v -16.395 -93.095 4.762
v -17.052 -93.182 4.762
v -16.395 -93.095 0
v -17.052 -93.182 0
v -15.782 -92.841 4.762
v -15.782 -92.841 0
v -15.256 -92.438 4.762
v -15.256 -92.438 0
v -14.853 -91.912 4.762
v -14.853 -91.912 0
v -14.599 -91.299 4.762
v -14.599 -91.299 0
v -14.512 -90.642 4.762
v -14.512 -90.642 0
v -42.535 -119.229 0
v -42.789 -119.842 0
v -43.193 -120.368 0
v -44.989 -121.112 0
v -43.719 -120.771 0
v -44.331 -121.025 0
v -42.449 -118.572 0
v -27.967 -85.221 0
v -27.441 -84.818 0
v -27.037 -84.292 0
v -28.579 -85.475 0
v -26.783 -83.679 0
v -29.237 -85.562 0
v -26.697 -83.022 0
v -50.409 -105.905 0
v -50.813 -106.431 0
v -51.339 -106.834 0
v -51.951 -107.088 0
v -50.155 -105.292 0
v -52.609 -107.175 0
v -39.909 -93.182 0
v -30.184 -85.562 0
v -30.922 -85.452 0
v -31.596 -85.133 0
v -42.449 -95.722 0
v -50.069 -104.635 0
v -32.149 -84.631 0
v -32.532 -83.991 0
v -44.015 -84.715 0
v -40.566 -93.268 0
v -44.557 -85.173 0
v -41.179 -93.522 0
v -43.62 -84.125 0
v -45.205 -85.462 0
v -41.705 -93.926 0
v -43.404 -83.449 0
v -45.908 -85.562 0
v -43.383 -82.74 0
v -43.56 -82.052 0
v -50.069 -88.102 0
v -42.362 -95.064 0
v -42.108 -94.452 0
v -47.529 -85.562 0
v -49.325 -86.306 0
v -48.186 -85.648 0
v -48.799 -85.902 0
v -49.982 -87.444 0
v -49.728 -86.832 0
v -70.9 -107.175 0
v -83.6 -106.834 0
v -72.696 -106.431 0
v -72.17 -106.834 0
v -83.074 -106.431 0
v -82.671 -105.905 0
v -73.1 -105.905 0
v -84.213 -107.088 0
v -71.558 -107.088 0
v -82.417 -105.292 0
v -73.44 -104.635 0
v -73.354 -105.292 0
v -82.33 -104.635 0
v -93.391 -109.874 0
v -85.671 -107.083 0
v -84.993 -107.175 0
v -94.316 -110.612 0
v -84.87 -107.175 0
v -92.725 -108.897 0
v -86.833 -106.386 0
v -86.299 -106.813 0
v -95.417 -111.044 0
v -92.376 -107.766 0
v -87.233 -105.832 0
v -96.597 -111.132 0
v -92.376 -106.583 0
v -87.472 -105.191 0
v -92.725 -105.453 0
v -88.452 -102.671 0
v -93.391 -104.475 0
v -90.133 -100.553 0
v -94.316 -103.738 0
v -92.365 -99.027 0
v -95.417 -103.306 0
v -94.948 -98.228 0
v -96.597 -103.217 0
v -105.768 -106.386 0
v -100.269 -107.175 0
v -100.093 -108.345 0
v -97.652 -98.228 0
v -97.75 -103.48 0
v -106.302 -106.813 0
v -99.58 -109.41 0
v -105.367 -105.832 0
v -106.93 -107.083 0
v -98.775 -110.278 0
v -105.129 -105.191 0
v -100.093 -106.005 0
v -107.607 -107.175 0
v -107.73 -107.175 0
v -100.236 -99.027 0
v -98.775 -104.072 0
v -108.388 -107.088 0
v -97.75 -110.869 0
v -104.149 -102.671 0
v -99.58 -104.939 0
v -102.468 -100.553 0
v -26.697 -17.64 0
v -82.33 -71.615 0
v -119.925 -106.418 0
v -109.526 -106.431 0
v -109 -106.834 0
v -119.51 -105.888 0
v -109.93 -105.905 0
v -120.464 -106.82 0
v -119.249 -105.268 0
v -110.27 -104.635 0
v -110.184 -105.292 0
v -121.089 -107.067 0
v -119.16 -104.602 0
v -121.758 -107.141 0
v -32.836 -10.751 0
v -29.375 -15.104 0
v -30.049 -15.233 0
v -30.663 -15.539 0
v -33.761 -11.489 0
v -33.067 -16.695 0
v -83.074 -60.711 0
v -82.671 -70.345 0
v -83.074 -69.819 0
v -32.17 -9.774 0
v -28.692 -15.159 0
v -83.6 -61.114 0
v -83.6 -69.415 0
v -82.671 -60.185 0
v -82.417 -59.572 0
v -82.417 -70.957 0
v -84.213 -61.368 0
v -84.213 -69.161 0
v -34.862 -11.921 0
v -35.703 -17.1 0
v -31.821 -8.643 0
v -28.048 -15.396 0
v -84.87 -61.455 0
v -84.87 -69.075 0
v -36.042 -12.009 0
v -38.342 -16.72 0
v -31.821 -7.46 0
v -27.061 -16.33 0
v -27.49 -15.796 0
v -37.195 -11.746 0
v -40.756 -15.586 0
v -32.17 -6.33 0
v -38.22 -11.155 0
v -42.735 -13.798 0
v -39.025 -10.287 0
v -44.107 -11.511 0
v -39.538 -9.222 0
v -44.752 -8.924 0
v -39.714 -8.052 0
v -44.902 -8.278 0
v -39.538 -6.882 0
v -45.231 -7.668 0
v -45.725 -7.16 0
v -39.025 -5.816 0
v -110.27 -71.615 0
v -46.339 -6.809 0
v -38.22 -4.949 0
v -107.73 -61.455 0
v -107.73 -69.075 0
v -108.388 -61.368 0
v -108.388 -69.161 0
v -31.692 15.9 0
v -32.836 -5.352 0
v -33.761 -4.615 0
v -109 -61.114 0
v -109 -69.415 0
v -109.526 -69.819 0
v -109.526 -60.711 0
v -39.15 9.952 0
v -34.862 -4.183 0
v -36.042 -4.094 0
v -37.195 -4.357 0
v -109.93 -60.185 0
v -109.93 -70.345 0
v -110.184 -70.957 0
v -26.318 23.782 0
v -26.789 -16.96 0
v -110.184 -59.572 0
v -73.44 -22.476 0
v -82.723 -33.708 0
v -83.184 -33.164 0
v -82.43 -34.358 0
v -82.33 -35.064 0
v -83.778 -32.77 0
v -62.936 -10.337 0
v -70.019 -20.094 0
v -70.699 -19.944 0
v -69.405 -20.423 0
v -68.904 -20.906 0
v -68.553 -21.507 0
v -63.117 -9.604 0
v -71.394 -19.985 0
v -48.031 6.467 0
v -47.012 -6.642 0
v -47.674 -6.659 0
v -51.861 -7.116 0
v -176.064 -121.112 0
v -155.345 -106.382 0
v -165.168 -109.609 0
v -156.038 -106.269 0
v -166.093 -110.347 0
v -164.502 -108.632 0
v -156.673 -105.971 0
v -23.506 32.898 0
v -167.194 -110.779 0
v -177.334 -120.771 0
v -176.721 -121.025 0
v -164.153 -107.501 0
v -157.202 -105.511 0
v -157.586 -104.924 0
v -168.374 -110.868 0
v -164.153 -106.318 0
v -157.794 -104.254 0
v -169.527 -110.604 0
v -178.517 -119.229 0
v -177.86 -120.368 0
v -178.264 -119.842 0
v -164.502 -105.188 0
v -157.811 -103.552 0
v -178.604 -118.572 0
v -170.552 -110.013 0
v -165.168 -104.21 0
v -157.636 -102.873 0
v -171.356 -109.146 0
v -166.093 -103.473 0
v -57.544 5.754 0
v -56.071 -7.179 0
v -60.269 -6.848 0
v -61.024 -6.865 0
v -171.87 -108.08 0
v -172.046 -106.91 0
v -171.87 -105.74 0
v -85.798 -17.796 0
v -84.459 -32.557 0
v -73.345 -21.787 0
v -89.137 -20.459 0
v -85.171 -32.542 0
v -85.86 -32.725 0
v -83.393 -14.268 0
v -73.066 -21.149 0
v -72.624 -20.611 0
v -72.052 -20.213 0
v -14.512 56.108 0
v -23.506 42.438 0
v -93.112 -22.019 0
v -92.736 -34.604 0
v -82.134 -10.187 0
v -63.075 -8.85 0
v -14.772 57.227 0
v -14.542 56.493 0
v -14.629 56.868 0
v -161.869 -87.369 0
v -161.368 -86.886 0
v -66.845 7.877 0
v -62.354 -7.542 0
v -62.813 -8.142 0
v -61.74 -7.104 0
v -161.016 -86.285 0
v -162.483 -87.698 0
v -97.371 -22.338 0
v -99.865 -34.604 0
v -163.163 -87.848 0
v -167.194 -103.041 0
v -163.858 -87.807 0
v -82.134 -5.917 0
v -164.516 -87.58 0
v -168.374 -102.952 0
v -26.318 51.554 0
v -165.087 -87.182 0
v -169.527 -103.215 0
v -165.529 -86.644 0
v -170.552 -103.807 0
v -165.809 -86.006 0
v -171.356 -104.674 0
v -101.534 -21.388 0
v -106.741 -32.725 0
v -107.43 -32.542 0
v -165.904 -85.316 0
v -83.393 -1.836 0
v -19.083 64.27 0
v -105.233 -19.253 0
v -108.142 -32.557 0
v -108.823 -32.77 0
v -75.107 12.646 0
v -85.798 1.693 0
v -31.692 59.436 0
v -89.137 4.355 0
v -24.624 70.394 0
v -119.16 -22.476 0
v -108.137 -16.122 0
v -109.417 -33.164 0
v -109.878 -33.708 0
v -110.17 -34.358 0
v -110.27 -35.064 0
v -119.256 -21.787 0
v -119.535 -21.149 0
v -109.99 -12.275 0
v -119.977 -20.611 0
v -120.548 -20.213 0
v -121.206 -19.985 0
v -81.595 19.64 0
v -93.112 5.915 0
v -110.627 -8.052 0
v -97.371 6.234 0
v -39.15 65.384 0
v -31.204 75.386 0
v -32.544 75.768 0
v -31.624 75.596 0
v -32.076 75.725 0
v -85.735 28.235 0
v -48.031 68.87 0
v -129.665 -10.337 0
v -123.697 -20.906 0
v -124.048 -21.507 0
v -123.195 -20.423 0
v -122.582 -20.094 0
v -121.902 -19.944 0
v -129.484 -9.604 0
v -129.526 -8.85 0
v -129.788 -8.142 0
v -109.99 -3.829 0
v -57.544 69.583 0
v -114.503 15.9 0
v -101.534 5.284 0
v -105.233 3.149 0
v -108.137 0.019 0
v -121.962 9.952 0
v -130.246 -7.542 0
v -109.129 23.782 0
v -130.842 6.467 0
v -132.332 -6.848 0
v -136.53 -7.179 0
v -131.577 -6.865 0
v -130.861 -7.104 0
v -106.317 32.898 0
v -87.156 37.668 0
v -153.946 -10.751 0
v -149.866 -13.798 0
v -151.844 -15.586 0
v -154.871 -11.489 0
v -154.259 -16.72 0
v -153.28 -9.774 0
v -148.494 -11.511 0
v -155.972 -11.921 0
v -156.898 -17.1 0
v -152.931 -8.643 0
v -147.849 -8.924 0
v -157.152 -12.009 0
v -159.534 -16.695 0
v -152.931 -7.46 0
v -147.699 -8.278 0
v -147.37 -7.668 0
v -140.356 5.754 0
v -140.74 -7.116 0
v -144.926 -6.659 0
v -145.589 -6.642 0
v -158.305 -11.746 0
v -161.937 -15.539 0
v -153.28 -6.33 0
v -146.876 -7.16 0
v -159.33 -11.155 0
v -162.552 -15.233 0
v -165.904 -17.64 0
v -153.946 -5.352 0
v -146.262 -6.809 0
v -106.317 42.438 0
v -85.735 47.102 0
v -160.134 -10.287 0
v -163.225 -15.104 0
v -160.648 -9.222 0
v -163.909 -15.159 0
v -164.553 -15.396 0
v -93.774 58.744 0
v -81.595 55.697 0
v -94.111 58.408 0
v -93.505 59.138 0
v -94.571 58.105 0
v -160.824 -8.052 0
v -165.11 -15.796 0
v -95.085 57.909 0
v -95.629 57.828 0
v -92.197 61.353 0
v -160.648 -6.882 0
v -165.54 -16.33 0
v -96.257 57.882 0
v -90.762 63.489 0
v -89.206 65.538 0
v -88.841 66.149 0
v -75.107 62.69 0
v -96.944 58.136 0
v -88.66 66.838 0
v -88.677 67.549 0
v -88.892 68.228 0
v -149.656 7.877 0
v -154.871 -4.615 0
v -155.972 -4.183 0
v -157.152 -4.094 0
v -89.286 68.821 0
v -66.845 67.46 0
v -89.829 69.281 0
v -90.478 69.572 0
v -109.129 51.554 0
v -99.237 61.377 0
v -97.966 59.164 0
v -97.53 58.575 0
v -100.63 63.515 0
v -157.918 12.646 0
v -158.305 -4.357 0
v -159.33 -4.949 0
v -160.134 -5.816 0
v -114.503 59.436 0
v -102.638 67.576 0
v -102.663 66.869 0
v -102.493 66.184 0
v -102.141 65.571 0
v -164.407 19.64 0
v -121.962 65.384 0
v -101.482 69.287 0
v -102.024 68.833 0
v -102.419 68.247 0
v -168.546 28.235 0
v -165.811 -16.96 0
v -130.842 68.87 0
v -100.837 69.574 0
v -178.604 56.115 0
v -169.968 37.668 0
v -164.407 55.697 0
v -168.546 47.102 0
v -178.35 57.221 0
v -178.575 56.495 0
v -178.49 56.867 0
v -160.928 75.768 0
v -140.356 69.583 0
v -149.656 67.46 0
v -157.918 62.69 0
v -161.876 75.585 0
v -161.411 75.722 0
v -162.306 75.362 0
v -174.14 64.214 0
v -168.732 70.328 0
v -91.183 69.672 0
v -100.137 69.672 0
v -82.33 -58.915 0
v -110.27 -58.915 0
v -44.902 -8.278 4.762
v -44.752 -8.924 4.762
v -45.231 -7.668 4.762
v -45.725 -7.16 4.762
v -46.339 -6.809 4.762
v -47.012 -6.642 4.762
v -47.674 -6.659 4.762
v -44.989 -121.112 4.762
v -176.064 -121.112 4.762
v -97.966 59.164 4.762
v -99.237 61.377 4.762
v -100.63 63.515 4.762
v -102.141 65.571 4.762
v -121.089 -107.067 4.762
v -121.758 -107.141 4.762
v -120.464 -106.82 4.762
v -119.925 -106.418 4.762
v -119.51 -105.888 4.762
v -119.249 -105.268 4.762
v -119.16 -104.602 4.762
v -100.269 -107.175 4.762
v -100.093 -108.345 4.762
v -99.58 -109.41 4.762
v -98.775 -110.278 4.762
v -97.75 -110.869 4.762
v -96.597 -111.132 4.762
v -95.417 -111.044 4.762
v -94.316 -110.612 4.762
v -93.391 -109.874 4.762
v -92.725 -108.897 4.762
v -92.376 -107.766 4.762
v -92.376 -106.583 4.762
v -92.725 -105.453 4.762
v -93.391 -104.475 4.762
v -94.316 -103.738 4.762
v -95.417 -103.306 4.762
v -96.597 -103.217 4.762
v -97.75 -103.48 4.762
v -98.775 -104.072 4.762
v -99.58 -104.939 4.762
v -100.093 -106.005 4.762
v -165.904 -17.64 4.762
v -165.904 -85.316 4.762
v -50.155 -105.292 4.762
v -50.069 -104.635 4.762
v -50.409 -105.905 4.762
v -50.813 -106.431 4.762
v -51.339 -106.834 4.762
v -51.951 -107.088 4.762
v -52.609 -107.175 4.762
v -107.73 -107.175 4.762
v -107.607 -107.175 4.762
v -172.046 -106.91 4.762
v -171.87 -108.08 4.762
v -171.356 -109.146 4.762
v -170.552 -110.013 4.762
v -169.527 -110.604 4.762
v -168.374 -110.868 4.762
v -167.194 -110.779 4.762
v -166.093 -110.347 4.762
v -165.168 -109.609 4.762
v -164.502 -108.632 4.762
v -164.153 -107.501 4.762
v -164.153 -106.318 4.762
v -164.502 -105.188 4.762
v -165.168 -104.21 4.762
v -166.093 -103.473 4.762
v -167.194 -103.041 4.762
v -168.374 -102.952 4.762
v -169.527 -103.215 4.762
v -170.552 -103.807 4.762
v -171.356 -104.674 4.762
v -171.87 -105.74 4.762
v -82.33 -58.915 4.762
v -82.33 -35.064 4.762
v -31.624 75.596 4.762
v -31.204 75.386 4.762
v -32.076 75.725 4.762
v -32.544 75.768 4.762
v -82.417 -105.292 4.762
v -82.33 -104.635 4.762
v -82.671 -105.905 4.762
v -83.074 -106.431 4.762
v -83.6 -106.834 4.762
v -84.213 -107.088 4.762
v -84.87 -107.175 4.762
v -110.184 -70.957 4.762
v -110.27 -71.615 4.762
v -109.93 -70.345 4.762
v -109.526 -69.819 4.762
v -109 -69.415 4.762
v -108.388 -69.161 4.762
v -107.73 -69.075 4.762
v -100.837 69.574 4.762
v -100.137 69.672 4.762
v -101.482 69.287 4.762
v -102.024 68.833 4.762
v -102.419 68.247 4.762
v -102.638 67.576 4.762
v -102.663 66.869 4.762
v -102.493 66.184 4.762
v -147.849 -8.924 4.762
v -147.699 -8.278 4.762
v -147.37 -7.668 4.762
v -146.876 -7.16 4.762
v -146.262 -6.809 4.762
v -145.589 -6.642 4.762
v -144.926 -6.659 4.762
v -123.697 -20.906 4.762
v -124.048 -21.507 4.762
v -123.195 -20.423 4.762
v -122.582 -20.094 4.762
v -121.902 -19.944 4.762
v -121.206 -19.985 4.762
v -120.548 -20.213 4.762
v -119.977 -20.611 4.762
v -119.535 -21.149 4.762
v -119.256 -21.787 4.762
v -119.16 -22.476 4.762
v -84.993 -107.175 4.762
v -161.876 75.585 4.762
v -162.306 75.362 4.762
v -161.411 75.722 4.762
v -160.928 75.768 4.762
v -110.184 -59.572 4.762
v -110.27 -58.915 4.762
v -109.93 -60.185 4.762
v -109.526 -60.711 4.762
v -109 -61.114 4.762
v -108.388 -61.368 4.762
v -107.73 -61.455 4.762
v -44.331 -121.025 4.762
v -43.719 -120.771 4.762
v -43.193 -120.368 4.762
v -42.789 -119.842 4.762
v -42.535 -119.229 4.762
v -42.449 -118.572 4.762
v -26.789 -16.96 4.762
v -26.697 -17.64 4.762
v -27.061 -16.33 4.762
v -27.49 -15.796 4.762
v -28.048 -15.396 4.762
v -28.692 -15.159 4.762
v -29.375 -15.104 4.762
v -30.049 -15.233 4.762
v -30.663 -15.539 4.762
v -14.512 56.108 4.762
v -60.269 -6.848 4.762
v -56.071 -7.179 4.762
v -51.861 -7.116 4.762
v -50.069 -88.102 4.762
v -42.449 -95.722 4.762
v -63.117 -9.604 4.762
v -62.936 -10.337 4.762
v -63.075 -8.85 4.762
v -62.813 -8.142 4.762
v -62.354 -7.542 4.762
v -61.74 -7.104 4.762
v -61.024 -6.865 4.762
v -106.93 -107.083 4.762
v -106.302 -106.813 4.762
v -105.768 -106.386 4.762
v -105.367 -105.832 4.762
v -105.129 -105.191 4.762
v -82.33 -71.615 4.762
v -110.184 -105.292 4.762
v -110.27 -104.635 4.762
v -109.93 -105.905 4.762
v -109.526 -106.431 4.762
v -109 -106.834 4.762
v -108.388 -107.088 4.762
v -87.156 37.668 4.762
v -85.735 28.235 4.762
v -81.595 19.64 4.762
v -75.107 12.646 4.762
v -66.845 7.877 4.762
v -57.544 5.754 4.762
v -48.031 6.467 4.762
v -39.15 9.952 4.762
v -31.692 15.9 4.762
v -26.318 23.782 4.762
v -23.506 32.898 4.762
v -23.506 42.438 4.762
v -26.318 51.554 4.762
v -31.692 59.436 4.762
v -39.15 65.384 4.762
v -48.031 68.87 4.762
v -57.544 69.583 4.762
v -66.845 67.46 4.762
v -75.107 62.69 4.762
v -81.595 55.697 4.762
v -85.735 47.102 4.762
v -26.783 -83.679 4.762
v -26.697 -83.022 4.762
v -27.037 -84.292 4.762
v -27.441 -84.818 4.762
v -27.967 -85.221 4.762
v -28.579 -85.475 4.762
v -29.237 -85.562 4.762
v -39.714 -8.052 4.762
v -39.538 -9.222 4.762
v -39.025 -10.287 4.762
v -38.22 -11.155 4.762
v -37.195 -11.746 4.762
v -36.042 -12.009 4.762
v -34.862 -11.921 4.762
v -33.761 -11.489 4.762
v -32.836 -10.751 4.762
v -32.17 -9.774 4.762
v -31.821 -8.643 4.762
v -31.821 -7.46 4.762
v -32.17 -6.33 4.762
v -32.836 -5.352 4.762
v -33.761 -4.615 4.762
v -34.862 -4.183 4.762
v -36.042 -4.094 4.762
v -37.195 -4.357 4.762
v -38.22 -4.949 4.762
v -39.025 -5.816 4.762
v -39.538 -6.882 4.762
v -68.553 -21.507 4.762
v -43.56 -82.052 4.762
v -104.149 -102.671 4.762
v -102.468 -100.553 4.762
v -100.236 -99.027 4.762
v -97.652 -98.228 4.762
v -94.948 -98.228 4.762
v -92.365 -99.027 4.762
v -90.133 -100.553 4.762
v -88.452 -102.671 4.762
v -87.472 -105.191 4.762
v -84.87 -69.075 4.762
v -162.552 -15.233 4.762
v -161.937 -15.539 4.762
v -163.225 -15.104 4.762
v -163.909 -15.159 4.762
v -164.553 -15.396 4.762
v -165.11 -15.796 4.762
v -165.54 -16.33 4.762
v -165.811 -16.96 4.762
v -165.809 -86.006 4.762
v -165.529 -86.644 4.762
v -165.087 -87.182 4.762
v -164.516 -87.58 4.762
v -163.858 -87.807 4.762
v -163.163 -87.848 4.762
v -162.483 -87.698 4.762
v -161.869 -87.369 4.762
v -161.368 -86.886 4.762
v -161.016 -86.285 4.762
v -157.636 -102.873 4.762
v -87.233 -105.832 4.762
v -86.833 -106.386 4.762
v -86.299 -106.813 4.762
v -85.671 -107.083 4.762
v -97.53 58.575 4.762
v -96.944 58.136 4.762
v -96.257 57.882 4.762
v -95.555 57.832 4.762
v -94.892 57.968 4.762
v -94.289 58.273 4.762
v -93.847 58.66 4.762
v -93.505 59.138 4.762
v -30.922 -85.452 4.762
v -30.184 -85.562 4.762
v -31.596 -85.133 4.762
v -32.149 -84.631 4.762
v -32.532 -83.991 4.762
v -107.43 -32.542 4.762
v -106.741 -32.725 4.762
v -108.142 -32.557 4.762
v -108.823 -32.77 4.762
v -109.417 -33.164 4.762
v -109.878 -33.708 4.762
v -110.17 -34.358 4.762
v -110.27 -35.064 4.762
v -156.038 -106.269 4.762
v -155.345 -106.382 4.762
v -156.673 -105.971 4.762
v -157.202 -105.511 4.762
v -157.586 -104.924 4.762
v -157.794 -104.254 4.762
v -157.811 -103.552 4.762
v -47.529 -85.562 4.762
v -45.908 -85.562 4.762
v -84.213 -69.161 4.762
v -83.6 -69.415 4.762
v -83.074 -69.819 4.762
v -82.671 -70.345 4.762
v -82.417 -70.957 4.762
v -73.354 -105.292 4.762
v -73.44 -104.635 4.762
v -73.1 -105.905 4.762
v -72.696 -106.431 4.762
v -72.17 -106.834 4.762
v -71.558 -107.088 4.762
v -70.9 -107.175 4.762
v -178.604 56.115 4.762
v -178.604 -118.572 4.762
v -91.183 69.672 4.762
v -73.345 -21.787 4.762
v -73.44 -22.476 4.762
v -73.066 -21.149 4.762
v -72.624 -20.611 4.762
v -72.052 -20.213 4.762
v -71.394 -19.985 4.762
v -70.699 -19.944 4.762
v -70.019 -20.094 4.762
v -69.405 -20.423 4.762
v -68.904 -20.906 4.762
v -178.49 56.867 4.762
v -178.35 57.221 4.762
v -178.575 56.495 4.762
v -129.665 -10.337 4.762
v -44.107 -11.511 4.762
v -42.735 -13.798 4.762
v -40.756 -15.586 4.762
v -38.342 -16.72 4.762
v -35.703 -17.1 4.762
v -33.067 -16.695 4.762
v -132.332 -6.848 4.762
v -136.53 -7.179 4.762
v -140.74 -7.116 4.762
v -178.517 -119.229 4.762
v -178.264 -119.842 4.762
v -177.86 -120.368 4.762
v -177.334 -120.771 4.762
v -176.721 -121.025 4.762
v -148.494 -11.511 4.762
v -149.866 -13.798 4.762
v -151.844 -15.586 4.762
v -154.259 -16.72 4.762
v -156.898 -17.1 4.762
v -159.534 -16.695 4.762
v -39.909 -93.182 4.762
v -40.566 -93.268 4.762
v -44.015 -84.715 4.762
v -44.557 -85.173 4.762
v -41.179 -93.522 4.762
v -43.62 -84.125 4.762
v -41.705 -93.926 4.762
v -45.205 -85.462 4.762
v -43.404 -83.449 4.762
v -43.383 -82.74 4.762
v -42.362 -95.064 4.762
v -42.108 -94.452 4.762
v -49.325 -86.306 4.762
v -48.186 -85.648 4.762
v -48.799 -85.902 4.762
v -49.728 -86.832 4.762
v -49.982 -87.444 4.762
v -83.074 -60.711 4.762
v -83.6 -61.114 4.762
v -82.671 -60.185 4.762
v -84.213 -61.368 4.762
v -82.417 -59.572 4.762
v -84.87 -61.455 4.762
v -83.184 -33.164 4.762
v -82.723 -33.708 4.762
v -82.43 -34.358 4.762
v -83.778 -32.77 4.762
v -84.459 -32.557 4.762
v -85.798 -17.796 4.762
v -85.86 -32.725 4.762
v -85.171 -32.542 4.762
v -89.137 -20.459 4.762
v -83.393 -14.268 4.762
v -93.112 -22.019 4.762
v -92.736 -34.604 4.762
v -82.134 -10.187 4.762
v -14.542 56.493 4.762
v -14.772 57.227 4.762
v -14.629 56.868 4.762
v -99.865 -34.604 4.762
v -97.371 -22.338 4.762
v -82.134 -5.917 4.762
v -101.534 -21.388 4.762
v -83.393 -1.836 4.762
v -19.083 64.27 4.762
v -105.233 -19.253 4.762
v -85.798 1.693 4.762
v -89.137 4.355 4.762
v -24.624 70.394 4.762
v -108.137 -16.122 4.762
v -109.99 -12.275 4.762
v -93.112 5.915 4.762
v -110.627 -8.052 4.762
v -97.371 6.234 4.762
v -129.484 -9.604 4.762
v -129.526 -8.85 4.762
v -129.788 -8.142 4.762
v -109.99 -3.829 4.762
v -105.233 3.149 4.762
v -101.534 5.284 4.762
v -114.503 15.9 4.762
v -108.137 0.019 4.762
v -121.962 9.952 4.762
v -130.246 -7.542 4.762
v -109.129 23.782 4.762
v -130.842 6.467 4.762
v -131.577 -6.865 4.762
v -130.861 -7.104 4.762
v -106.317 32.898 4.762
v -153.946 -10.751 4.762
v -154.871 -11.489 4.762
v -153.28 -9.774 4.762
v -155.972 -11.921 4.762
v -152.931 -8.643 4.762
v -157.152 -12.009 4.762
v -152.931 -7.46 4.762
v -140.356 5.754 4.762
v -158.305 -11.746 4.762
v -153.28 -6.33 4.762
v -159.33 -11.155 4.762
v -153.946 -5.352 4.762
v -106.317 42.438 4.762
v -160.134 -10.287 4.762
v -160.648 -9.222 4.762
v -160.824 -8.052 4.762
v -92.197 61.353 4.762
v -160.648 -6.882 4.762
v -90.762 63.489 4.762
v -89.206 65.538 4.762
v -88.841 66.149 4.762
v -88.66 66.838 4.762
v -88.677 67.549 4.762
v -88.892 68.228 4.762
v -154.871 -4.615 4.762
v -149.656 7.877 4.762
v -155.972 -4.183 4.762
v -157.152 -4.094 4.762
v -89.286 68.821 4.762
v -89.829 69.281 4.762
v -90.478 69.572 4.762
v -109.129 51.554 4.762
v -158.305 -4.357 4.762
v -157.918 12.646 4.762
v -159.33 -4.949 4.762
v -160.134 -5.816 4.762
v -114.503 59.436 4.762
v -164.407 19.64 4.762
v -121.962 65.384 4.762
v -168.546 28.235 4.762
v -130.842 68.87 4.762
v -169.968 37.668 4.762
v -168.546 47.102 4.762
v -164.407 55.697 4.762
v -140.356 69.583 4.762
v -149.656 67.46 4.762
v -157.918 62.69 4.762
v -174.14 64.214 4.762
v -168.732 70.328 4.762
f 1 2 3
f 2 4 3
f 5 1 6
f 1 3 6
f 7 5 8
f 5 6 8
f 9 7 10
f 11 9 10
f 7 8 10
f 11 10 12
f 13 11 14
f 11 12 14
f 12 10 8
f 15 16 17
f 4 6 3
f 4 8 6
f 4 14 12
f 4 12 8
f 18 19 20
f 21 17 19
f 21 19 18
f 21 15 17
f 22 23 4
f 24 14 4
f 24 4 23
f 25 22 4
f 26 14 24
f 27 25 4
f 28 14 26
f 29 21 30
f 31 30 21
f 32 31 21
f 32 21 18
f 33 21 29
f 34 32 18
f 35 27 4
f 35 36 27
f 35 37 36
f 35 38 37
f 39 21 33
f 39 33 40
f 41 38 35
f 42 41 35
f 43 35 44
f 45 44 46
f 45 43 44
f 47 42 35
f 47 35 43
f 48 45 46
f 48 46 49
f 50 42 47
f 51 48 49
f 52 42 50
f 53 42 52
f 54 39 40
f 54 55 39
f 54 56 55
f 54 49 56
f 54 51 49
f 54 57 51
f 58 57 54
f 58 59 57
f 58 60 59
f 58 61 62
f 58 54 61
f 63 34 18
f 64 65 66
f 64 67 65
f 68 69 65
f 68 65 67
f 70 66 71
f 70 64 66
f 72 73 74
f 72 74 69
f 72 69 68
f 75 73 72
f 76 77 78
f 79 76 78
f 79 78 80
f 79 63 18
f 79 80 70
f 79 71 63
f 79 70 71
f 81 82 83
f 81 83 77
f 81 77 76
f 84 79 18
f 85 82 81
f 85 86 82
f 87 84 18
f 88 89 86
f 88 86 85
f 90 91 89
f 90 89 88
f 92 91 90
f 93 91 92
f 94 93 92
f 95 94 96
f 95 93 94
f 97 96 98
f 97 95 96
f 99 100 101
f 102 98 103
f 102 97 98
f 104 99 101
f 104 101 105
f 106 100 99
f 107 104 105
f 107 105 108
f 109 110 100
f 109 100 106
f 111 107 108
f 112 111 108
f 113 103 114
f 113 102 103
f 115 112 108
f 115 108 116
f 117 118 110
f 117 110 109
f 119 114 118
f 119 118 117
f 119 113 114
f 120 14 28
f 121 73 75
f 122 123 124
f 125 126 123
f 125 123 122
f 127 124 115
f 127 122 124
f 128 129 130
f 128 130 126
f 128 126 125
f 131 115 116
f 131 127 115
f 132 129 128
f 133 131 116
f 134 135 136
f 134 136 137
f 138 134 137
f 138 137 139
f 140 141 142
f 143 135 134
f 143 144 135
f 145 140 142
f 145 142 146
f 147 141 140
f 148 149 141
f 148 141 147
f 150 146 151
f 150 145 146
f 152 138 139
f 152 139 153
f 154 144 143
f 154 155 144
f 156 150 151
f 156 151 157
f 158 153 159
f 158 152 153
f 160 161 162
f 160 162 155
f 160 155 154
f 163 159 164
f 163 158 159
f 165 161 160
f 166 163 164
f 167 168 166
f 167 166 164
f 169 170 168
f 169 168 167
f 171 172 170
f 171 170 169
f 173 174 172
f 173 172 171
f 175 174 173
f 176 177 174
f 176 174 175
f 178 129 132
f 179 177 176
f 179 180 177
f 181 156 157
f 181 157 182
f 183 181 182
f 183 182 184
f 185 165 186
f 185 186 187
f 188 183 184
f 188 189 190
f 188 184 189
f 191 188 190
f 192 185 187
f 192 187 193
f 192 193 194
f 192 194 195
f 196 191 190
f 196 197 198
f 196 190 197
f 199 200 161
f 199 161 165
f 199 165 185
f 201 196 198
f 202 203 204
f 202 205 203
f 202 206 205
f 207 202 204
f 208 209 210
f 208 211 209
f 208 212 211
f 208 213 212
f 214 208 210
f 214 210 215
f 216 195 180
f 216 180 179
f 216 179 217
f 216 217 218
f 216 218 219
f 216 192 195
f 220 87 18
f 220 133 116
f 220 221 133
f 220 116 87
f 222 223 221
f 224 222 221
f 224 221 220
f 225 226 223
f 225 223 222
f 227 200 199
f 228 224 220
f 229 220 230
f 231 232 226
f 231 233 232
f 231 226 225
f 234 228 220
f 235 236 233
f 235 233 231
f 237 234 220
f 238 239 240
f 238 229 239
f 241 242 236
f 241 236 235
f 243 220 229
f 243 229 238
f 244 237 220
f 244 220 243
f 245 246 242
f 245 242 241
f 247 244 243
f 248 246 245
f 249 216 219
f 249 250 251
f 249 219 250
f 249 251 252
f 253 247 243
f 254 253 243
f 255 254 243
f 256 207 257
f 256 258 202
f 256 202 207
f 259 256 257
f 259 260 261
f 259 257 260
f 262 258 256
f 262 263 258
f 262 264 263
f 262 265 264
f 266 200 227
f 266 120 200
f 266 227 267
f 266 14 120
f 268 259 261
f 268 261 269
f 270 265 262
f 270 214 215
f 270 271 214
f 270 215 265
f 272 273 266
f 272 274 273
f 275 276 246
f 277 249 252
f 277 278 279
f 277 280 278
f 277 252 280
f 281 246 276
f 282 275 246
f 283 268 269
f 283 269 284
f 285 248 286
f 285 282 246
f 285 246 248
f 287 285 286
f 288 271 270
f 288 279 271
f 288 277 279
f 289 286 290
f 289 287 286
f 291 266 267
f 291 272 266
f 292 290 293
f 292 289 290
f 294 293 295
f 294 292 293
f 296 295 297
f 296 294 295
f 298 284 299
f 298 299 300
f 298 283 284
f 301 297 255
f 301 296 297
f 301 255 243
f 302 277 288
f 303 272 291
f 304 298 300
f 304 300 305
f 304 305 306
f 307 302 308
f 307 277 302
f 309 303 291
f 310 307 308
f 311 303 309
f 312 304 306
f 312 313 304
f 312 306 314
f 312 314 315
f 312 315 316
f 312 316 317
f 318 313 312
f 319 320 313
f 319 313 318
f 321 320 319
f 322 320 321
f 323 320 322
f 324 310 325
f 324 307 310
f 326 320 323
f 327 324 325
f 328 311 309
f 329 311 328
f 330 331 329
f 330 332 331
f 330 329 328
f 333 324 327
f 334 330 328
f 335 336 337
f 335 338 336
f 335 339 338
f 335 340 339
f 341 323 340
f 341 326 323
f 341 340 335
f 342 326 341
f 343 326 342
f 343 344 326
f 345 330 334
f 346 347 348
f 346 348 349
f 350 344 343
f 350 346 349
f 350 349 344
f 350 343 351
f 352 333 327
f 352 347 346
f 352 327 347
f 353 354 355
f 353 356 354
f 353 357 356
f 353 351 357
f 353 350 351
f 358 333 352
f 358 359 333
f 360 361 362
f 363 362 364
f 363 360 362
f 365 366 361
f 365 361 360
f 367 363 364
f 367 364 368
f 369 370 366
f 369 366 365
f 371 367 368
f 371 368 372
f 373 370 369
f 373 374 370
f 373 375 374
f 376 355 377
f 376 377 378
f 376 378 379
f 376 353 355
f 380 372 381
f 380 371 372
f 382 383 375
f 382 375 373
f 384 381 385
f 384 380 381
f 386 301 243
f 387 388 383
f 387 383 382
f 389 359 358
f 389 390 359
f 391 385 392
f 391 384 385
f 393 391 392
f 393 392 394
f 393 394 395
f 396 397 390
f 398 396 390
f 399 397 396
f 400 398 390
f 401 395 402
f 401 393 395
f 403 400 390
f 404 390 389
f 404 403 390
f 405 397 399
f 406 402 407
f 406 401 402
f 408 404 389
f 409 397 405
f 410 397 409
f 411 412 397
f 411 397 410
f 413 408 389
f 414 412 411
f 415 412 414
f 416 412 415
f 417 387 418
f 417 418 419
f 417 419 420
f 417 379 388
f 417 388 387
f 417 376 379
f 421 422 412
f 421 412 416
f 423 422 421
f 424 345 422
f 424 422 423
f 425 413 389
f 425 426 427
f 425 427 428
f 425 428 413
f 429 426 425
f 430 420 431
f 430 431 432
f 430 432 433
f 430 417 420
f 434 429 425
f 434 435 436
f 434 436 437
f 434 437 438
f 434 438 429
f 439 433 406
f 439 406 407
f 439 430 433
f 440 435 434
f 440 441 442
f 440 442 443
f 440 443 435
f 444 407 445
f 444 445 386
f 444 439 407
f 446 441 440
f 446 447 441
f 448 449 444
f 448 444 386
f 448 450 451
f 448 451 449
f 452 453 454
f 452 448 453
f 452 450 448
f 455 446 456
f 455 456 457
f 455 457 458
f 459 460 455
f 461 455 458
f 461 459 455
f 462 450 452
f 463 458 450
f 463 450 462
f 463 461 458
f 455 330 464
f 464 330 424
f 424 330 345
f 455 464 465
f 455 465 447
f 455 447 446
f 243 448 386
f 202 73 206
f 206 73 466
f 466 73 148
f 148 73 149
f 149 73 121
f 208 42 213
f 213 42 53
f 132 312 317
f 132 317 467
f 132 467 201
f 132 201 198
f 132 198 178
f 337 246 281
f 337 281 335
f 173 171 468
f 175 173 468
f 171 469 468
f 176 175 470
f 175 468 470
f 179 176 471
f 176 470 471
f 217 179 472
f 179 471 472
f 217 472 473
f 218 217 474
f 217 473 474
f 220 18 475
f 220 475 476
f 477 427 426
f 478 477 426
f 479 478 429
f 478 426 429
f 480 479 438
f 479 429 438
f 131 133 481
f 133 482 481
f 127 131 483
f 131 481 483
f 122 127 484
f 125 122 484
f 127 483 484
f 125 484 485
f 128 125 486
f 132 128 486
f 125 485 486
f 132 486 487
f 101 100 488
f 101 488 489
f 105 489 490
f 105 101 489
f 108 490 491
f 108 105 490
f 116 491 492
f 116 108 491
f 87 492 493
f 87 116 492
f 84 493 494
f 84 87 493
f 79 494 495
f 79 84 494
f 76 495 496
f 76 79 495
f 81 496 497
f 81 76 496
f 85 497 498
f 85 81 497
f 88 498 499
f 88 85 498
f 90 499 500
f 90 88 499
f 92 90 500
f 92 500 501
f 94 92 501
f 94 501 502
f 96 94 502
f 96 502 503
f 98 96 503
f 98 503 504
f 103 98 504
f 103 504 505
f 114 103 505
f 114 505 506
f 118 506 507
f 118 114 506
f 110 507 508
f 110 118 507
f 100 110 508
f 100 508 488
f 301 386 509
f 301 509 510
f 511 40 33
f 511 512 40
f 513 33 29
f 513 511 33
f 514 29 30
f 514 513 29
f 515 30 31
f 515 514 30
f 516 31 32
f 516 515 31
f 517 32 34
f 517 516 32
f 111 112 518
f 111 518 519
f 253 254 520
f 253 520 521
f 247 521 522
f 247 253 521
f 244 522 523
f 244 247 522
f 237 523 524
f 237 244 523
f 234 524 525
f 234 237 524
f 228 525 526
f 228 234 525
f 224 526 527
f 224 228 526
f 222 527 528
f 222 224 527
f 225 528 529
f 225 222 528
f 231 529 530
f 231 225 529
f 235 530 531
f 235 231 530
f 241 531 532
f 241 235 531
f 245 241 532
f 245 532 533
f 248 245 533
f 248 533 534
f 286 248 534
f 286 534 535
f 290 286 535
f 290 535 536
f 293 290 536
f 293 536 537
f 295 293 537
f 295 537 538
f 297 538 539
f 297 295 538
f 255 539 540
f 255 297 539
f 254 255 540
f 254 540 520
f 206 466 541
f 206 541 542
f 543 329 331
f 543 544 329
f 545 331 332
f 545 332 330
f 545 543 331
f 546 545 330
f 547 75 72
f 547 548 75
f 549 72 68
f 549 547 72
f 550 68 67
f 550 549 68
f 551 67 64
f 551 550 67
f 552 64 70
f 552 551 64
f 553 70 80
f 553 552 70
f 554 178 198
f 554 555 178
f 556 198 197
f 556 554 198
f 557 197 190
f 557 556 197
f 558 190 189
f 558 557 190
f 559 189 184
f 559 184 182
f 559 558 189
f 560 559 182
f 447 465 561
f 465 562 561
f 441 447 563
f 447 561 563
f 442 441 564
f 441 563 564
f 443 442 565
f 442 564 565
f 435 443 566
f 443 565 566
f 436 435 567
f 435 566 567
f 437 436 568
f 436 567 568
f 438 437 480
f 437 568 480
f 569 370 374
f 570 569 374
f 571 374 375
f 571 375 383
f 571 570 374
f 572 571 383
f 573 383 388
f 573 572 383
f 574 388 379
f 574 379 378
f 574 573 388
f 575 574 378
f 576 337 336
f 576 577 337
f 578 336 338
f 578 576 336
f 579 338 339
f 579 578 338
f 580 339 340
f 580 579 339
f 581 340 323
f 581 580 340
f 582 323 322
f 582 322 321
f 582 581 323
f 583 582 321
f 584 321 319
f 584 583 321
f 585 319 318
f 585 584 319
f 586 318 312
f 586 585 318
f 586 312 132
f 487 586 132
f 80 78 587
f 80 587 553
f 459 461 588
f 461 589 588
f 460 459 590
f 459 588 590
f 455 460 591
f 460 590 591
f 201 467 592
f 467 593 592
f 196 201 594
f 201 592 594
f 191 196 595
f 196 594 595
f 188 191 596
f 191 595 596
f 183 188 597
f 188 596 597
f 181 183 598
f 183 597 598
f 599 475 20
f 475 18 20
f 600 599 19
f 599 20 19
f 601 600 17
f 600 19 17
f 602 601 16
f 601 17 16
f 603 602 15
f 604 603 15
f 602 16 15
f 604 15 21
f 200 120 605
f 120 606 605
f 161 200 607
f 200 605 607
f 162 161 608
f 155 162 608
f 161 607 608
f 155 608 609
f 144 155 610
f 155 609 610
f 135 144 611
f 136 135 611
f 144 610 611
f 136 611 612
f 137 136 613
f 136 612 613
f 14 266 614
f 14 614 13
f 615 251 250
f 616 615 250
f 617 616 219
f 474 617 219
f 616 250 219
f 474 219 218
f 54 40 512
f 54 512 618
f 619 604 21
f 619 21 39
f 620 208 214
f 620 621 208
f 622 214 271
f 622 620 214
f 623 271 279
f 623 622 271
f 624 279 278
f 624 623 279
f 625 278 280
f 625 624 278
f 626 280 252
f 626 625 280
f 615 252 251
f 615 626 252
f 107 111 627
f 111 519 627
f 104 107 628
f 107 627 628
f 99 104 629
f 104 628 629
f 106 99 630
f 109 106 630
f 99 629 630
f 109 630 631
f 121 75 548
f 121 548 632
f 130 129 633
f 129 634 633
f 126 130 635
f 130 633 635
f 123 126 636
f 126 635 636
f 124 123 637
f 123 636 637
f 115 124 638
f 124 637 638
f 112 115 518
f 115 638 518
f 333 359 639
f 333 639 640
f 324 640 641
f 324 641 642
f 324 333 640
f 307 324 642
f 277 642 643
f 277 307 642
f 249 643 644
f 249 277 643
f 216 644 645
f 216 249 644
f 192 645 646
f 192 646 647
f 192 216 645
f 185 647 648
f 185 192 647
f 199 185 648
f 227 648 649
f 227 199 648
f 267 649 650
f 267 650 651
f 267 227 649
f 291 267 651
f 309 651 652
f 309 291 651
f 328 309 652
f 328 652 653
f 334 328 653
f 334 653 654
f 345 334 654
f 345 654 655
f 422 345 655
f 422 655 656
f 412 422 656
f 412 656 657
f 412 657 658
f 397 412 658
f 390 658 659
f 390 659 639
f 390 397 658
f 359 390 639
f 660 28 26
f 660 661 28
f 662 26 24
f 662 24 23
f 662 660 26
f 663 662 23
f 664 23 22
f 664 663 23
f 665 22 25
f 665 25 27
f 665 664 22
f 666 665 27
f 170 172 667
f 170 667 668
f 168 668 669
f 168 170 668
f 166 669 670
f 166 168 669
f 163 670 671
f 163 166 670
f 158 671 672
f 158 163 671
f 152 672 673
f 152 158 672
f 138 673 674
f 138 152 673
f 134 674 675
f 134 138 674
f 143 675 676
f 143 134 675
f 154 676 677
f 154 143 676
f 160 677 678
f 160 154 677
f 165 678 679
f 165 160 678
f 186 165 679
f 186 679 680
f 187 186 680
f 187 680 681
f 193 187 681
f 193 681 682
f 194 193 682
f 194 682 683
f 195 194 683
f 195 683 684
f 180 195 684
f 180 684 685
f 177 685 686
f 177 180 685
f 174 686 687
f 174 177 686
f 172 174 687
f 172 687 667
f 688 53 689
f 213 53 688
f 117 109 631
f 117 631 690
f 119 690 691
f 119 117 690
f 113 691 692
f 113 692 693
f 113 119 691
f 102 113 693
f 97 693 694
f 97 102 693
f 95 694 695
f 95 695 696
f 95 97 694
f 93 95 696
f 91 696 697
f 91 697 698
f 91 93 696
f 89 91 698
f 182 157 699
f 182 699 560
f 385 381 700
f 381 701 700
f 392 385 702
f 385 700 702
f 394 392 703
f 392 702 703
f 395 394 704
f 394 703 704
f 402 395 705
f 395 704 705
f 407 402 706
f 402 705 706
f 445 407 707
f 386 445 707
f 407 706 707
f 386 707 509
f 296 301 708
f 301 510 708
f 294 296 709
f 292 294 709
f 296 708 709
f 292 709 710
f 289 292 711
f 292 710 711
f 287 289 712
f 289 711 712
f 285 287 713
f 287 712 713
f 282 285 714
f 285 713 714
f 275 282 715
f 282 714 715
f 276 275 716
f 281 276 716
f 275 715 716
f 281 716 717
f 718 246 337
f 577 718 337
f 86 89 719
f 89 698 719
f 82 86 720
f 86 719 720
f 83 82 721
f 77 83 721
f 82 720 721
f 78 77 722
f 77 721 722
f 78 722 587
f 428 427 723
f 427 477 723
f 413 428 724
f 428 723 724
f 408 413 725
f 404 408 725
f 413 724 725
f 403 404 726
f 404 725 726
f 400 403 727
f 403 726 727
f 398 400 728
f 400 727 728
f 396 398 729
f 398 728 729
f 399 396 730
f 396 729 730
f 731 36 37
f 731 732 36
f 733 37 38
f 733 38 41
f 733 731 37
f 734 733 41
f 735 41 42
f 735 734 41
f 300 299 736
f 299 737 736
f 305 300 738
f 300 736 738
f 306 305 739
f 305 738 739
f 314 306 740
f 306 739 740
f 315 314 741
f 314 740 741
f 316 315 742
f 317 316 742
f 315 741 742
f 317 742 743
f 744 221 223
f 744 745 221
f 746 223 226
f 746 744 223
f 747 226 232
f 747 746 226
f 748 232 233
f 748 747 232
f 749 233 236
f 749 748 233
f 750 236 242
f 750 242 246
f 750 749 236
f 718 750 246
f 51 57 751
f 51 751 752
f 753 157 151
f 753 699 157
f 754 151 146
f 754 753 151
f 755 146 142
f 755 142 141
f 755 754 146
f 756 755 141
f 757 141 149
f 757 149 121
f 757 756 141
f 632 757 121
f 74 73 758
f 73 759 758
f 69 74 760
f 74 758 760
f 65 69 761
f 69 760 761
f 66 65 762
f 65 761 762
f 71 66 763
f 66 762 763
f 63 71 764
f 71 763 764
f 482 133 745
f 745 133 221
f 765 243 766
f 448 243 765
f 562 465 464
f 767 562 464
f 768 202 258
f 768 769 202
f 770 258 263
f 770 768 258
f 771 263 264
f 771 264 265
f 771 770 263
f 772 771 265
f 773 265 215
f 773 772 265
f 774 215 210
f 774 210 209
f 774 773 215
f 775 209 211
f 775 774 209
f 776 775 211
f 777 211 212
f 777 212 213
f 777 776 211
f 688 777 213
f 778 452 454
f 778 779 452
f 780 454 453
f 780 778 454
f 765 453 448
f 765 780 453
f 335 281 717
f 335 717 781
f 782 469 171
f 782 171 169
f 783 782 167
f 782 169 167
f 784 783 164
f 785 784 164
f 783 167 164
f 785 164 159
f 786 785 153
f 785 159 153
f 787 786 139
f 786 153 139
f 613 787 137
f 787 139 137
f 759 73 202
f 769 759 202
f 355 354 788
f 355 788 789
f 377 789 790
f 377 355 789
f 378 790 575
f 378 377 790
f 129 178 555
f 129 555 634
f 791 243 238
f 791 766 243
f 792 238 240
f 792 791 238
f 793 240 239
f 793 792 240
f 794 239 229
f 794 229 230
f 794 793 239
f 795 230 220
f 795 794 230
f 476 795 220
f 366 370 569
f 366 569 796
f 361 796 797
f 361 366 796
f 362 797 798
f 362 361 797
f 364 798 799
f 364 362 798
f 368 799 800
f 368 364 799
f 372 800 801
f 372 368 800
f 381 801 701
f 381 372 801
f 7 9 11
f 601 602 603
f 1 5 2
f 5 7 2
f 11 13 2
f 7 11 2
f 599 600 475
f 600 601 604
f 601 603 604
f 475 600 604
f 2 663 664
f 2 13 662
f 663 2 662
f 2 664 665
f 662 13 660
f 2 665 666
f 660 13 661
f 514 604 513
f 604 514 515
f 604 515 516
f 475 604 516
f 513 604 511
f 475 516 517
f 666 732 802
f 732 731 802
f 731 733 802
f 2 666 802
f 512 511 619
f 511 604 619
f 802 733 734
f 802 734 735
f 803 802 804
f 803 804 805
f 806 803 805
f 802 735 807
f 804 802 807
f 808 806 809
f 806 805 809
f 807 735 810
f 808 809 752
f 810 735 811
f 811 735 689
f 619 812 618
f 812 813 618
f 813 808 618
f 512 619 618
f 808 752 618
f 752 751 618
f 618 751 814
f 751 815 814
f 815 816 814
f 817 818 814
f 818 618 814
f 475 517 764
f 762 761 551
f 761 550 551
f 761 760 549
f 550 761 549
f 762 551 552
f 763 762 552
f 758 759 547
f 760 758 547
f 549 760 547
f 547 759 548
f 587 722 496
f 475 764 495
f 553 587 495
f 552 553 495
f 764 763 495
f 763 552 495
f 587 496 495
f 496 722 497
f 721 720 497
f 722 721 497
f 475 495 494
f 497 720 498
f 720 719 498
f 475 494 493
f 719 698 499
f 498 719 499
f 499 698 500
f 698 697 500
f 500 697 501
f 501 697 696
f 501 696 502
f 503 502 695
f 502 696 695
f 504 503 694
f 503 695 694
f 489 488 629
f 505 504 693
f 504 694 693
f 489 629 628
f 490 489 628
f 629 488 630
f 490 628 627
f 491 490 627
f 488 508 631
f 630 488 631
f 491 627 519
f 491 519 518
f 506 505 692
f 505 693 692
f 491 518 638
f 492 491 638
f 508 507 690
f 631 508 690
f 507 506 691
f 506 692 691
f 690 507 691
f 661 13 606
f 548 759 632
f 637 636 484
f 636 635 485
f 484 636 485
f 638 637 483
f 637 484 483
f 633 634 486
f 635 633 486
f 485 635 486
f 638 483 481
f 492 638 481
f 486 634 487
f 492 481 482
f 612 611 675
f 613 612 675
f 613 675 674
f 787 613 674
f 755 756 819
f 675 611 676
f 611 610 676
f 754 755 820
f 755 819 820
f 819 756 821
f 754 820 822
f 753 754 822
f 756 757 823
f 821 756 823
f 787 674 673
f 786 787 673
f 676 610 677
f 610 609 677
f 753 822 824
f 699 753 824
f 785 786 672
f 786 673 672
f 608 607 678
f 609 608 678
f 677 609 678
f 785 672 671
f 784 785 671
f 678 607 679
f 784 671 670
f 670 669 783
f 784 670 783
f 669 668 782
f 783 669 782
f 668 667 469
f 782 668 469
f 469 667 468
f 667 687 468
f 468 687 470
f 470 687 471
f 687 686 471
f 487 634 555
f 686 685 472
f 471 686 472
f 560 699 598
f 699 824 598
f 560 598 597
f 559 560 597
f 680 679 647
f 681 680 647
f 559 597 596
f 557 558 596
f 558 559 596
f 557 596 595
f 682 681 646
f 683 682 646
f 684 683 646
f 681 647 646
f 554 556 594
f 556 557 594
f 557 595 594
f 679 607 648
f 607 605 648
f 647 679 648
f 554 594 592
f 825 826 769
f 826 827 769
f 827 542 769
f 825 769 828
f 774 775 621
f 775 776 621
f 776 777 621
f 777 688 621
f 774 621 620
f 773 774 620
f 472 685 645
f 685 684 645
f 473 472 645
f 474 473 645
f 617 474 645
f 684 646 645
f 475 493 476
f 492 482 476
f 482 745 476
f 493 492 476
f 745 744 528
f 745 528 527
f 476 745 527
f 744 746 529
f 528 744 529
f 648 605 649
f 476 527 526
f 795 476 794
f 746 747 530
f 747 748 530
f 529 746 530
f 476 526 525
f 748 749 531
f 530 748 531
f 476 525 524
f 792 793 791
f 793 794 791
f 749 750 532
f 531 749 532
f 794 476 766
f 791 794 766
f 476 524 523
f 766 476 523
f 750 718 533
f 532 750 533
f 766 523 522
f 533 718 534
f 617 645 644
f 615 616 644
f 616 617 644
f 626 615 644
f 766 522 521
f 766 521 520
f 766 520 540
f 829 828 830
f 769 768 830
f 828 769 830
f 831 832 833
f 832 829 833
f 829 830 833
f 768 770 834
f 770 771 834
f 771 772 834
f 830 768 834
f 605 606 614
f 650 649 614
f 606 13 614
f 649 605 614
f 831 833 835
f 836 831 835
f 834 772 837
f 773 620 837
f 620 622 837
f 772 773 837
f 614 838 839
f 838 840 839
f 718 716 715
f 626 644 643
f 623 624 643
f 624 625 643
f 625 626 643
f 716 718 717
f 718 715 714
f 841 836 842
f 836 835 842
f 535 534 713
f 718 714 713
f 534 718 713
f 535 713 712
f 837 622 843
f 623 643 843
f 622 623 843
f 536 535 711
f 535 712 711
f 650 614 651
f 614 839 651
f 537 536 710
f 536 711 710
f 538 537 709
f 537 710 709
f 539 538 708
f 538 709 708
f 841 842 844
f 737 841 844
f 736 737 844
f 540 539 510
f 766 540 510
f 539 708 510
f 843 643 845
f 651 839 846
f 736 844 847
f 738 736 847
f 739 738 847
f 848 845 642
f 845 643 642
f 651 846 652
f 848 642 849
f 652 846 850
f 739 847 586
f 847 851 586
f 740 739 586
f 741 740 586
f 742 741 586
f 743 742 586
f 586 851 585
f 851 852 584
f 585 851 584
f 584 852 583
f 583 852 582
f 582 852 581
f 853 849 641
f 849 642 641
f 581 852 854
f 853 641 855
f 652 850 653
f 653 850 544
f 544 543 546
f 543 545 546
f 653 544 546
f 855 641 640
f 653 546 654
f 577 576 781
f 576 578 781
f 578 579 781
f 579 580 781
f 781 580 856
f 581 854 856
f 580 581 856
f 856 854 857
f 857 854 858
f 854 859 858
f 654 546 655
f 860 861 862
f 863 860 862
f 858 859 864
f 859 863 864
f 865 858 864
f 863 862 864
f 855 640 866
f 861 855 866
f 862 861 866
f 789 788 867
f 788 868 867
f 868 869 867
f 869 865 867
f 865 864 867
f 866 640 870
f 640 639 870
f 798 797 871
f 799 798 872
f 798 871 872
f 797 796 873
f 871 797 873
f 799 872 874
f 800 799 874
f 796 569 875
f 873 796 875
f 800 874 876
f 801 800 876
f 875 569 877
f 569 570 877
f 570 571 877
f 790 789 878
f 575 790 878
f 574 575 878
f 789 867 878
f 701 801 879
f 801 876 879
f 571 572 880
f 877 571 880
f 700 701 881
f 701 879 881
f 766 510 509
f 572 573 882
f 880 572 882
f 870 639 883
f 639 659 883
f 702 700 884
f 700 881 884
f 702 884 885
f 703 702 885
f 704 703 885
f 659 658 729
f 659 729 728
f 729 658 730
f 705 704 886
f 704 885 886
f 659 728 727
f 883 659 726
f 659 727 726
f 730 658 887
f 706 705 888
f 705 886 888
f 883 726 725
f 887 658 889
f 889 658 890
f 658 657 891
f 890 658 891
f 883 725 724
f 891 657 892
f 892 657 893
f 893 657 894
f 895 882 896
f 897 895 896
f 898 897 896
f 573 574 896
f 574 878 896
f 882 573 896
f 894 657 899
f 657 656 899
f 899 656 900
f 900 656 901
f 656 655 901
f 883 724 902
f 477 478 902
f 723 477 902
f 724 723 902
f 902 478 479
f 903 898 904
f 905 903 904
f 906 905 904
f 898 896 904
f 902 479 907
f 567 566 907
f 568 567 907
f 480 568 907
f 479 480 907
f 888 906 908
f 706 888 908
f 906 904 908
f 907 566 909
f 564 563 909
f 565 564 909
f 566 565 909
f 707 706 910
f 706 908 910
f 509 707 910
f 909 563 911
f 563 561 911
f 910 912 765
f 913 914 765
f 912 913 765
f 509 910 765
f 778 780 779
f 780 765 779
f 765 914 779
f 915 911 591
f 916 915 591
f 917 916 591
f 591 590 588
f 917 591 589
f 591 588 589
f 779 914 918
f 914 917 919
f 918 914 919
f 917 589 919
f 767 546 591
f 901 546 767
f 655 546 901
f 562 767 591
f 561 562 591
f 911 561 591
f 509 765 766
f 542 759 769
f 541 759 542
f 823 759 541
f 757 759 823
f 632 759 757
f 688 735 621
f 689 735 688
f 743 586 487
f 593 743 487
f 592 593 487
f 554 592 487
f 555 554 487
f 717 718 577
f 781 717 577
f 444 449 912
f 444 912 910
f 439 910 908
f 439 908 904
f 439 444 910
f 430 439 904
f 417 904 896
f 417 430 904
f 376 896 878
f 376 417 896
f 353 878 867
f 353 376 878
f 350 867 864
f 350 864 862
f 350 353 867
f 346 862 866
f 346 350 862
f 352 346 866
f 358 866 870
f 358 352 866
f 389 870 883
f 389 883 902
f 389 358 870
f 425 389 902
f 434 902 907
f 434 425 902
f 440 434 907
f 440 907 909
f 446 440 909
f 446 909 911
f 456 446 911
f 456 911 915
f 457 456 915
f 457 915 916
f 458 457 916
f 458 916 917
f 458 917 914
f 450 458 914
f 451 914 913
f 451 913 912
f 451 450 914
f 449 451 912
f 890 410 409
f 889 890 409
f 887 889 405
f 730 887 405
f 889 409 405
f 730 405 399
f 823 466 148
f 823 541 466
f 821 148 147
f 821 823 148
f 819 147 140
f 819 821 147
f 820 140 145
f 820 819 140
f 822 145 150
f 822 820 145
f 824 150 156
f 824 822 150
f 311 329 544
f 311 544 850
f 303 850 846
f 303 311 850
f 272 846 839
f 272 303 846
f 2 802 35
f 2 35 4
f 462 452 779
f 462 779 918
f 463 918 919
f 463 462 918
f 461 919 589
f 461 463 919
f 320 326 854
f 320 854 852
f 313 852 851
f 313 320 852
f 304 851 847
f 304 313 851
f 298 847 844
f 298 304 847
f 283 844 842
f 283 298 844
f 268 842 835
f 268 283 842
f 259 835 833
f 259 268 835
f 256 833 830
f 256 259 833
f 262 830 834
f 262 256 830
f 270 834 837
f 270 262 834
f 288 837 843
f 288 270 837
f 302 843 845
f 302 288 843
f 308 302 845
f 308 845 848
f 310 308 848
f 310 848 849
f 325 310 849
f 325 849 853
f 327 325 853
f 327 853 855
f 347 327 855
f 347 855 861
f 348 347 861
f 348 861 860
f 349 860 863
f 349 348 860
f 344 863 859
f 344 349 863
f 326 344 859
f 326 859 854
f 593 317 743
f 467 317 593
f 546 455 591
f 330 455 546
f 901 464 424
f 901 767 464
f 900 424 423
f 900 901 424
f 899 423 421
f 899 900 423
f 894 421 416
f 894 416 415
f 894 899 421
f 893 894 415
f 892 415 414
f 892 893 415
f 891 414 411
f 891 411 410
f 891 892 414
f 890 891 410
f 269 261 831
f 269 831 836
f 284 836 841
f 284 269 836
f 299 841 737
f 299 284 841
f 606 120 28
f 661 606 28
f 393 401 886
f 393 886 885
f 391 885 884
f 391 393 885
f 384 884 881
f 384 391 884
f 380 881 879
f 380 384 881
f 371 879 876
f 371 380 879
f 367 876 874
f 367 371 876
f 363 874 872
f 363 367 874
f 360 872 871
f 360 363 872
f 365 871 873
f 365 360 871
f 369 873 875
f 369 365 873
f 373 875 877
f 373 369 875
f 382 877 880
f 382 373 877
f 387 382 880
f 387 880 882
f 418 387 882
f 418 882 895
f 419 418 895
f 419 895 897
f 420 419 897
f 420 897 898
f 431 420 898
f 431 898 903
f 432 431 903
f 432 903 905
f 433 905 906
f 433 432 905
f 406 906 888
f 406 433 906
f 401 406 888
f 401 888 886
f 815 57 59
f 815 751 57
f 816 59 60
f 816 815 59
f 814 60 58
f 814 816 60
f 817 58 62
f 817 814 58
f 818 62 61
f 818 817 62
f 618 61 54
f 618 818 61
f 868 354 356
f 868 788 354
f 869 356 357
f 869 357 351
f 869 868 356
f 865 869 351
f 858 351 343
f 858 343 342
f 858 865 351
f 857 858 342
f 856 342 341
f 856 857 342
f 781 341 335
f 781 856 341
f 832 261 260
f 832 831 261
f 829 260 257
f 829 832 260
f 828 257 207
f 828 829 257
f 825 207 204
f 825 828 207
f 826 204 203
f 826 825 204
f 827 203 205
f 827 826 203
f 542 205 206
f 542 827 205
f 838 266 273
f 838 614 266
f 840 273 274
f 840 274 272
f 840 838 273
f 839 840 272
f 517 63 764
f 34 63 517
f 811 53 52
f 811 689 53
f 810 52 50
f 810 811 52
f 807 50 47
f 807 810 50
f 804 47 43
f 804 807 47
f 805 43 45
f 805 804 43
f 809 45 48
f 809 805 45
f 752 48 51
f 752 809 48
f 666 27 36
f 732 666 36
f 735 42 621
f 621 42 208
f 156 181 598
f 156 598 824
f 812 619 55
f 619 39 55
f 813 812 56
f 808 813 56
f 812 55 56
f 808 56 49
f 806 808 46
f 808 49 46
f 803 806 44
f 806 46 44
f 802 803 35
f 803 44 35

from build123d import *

# Parameters (mm, degrees)
SKETCH2_R           = 32.004
SKETCH2_R_2         = 14.326331359
SKETCH2_R_3         = 3.96875
BOSS_EXTRUDE3_DEPTH = 4.7625
FILLET2_R           = 2.54
FILLET3_R           = 2.54
FILLET4_R           = 2.54
FILLET5_R           = 2.54
SKETCH3_W           = 27.93619
SKETCH3_H           = 27.930200018
CUT_EXTRUDE1_DEPTH  = 4.7625
FILLET6_R           = 2.54
FILLET7_R           = 2.54


with BuildPart() as part:
    # Sketch2 → Boss-Extrude3 (new body)
    with BuildSketch(Plane.XY):
        with BuildLine():
            Line((-161.665509466, 75.768206346), (-31.830687389, 75.768206346))
            ThreePointArc((-31.830687389, 75.768206346), (-21.757108739, 67.512054819), (-14.51238939, 56.688235417))
            Line((-14.51238939, 56.688235417), (-14.51238939, -121.111764583))
            Line((-14.51238939, -121.111764583), (-178.60400939, -121.111764583))
            Line((-178.60400939, -121.111764583), (-178.60400939, 56.688235417))
            ThreePointArc((-178.60400939, 56.688235417), (-171.519463205, 67.457510218), (-161.665509466, 75.768206346))
        make_face()
        with Locations(Location((-137.96400939, 37.668206346, 0), (0, 0, 180))):
            Circle(SKETCH2_R, mode=Mode.SUBTRACT)
        with Locations(Location((-55.15238939, 37.668206346, 0), (0, 0, 180))):
            Circle(SKETCH2_R, mode=Mode.SUBTRACT)
        with Locations(Location((-96.30038939, -8.051793654, 0), (0, 0, 180))):
            Circle(SKETCH2_R_2, mode=Mode.SUBTRACT)
        with Locations(Location((-35.74551939, -8.051793654, 0), (0, 0, 180))):
            Circle(SKETCH2_R_3, mode=Mode.SUBTRACT)
        with Locations(Location((-156.85525939, -8.051793654, 0), (0, 0, 180))):
            Circle(SKETCH2_R_3, mode=Mode.SUBTRACT)
        with Locations(Location((-168.077299629, -106.909902872, 0), (0, 0, 180))):
            Circle(SKETCH2_R_3, mode=Mode.SUBTRACT)
        with Locations(Location((-96.30038939, -107.174765002, 0), (0, 0, 180))):
            Circle(SKETCH2_R_3, mode=Mode.SUBTRACT)
        Polygon((-119.16038939, -45.520207297), (-119.16038939, -76.631793654), (-119.16038939, -107.199674954), (-159.049264091, -106.297978958), (-119.16038939, -9.66645302), align=None, mode=Mode.SUBTRACT)
        Polygon((-73.44038939, -45.520207297), (-73.44038939, -76.631793654), (-73.44038939, -107.174765002), (-50.06857939, -107.174765002), (-50.06857939, -85.561564565), (-42.111373674, -85.561564565), (-73.44038939, -9.66645302), align=None, mode=Mode.SUBTRACT)
        with BuildLine():
            Line((-165.90400939, -8.051793654), (-165.90400939, -72.234249773))
            Line((-165.90400939, -72.234249773), (-165.90400939, -98.126015002))
            Line((-165.90400939, -98.126015002), (-127.899360964, -6.059061553))
            ThreePointArc((-127.899360964, -6.059061553), (-137.96400939, -7.202397682), (-148.028657817, -6.059061553))
            ThreePointArc((-148.028657817, -6.059061553), (-155.852721218, -17.044835062), (-165.90400939, -8.051793654))
        make_face(mode=Mode.SUBTRACT)
        with BuildLine():
            Line((-26.69676939, -8.051793654), (-26.69676939, -72.234249773))
            Line((-26.69676939, -72.234249773), (-26.69676939, -85.561564565))
            Line((-26.69676939, -85.561564565), (-31.883294019, -85.561564565))
            Line((-31.883294019, -85.561564565), (-64.701417817, -6.059061553))
            ThreePointArc((-64.701417817, -6.059061553), (-54.63676939, -7.202397682), (-44.572120964, -6.059061553))
            ThreePointArc((-44.572120964, -6.059061553), (-36.748057563, -17.044835062), (-26.69676939, -8.051793654))
        make_face(mode=Mode.SUBTRACT)
        with BuildLine():
            Line((-110.27038939, -107.174765002), (-105.34913939, -107.174765002))
            ThreePointArc((-105.34913939, -107.174765002), (-96.30038939, -98.126015002), (-87.25163939, -107.174765002))
            Line((-87.25163939, -107.174765002), (-82.33038939, -107.174765002))
            Line((-82.33038939, -107.174765002), (-82.33038939, -69.074765002))
            Line((-82.33038939, -69.074765002), (-110.27038939, -69.074765002))
            Line((-110.27038939, -69.074765002), (-110.27038939, -107.174765002))
        make_face(mode=Mode.SUBTRACT)
        with BuildLine():
            Line((-105.751769429, 69.672206346), (-85.417792119, 69.672206346))
            ThreePointArc((-85.417792119, 69.672206346), (-91.388421836, 62.588949087), (-95.759407575, 54.420997306))
            ThreePointArc((-95.759407575, 54.420997306), (-99.982218631, 62.553302087), (-105.751769429, 69.672206346))
        make_face(mode=Mode.SUBTRACT)
        with BuildLine():
            Line((-110.27038939, -30.911793654), (-110.27038939, -61.454765002))
            Line((-110.27038939, -61.454765002), (-82.33038939, -61.454765002))
            Line((-82.33038939, -61.454765002), (-82.33038939, -30.911793654))
            ThreePointArc((-82.33038939, -30.911793654), (-96.30038939, -34.842473003), (-110.27038939, -30.911793654))
        make_face(mode=Mode.SUBTRACT)
    extrude(amount=BOSS_EXTRUDE3_DEPTH)

    # Fillet2
    fillet2_edges = [part.edges().sort_by_distance(p)[0] for p in [
        (-82.33038939, -30.911793654, 2.38125),
        (-110.27038939, -30.911793654, 2.38125),
        (-148.028657817, -6.059061553, 2.38125),
        (-165.90400939, -8.051793654, 2.38125),
        (-26.69676939, -8.051793654, 2.38125),
        (-44.572120964, -6.059061553, 2.38125),
    ]]
    fillet(fillet2_edges, radius=FILLET2_R)

    # Fillet3
    fillet3_edges = [part.edges().sort_by_distance(p)[0] for p in [
        (-110.27038939, -61.454765002, 2.38125),
        (-82.33038939, -61.454765002, 2.38125),
        (-110.27038939, -107.174765002, 2.38125),
        (-105.34913939, -107.174765002, 2.38125),
        (-87.25163939, -107.174765002, 2.38125),
        (-82.33038939, -107.174765002, 2.38125),
        (-73.44038939, -107.174765002, 2.38125),
        (-50.06857939, -107.174765002, 2.38125),
        (-119.16038939, -107.199674954, 2.38125),
        (-26.69676939, -85.561564565, 2.38125),
    ]]
    fillet(fillet3_edges, radius=FILLET3_R)

    # Fillet4
    fillet4_edges = [part.edges().sort_by_distance(p)[0] for p in [
        (-82.33038939, -69.074765002, 2.38125),
        (-110.27038939, -69.074765002, 2.38125),
    ]]
    fillet(fillet4_edges, radius=FILLET4_R)

    # Fillet5
    fillet5_edges = [part.edges().sort_by_distance(p)[0] for p in [
        (-95.759407575, 54.420997306, 2.38125),
        (-85.417792119, 69.672206346, 2.38125),
        (-105.751769429, 69.672206346, 2.38125),
    ]]
    fillet(fillet5_edges, radius=FILLET5_R)

    # Sketch3 → Cut-Extrude1 (cut)
    with BuildSketch(Plane.XY.offset(4.7625)):
        with Locations((-28.48048439, -107.146664574)):
            Rectangle(SKETCH3_W, SKETCH3_H)
    extrude(amount=-CUT_EXTRUDE1_DEPTH, mode=Mode.SUBTRACT)

    # Fillet6
    fillet6_edges = [part.edges().sort_by_distance(p)[0] for p in [
        (-14.51238939, 56.688235417, 2.38125),
        (-178.60400939, -121.111764583, 2.38125),
        (-178.60400939, 56.688235417, 2.38125),
        (-161.665509466, 75.768206346, 2.38125),
        (-31.830687389, 75.768206346, 2.38125),
        (-14.51238939, -93.181564565, 2.38125),
        (-42.44857939, -121.111764583, 2.38125),
        (-42.44857939, -93.181564565, 2.38125),
    ]]
    fillet(fillet6_edges, radius=FILLET6_R)

    # Fillet7
    fillet7_edges = [part.edges().sort_by_distance(p)[0] for p in [
        (-73.44038939, -9.66645302, 2.38125),
        (-50.06857939, -85.561564565, 2.38125),
        (-42.111373674, -85.561564565, 2.38125),
        (-119.16038939, -9.66645302, 2.38125),
        (-159.049264091, -106.297978958, 2.38125),
        (-165.90400939, -98.126015002, 2.38125),
        (-127.899360964, -6.059061553, 2.38125),
        (-64.701417817, -6.059061553, 2.38125),
        (-31.883294019, -85.561564565, 2.38125),
    ]]
    fillet(fillet7_edges, radius=FILLET7_R)


solid = part.part
